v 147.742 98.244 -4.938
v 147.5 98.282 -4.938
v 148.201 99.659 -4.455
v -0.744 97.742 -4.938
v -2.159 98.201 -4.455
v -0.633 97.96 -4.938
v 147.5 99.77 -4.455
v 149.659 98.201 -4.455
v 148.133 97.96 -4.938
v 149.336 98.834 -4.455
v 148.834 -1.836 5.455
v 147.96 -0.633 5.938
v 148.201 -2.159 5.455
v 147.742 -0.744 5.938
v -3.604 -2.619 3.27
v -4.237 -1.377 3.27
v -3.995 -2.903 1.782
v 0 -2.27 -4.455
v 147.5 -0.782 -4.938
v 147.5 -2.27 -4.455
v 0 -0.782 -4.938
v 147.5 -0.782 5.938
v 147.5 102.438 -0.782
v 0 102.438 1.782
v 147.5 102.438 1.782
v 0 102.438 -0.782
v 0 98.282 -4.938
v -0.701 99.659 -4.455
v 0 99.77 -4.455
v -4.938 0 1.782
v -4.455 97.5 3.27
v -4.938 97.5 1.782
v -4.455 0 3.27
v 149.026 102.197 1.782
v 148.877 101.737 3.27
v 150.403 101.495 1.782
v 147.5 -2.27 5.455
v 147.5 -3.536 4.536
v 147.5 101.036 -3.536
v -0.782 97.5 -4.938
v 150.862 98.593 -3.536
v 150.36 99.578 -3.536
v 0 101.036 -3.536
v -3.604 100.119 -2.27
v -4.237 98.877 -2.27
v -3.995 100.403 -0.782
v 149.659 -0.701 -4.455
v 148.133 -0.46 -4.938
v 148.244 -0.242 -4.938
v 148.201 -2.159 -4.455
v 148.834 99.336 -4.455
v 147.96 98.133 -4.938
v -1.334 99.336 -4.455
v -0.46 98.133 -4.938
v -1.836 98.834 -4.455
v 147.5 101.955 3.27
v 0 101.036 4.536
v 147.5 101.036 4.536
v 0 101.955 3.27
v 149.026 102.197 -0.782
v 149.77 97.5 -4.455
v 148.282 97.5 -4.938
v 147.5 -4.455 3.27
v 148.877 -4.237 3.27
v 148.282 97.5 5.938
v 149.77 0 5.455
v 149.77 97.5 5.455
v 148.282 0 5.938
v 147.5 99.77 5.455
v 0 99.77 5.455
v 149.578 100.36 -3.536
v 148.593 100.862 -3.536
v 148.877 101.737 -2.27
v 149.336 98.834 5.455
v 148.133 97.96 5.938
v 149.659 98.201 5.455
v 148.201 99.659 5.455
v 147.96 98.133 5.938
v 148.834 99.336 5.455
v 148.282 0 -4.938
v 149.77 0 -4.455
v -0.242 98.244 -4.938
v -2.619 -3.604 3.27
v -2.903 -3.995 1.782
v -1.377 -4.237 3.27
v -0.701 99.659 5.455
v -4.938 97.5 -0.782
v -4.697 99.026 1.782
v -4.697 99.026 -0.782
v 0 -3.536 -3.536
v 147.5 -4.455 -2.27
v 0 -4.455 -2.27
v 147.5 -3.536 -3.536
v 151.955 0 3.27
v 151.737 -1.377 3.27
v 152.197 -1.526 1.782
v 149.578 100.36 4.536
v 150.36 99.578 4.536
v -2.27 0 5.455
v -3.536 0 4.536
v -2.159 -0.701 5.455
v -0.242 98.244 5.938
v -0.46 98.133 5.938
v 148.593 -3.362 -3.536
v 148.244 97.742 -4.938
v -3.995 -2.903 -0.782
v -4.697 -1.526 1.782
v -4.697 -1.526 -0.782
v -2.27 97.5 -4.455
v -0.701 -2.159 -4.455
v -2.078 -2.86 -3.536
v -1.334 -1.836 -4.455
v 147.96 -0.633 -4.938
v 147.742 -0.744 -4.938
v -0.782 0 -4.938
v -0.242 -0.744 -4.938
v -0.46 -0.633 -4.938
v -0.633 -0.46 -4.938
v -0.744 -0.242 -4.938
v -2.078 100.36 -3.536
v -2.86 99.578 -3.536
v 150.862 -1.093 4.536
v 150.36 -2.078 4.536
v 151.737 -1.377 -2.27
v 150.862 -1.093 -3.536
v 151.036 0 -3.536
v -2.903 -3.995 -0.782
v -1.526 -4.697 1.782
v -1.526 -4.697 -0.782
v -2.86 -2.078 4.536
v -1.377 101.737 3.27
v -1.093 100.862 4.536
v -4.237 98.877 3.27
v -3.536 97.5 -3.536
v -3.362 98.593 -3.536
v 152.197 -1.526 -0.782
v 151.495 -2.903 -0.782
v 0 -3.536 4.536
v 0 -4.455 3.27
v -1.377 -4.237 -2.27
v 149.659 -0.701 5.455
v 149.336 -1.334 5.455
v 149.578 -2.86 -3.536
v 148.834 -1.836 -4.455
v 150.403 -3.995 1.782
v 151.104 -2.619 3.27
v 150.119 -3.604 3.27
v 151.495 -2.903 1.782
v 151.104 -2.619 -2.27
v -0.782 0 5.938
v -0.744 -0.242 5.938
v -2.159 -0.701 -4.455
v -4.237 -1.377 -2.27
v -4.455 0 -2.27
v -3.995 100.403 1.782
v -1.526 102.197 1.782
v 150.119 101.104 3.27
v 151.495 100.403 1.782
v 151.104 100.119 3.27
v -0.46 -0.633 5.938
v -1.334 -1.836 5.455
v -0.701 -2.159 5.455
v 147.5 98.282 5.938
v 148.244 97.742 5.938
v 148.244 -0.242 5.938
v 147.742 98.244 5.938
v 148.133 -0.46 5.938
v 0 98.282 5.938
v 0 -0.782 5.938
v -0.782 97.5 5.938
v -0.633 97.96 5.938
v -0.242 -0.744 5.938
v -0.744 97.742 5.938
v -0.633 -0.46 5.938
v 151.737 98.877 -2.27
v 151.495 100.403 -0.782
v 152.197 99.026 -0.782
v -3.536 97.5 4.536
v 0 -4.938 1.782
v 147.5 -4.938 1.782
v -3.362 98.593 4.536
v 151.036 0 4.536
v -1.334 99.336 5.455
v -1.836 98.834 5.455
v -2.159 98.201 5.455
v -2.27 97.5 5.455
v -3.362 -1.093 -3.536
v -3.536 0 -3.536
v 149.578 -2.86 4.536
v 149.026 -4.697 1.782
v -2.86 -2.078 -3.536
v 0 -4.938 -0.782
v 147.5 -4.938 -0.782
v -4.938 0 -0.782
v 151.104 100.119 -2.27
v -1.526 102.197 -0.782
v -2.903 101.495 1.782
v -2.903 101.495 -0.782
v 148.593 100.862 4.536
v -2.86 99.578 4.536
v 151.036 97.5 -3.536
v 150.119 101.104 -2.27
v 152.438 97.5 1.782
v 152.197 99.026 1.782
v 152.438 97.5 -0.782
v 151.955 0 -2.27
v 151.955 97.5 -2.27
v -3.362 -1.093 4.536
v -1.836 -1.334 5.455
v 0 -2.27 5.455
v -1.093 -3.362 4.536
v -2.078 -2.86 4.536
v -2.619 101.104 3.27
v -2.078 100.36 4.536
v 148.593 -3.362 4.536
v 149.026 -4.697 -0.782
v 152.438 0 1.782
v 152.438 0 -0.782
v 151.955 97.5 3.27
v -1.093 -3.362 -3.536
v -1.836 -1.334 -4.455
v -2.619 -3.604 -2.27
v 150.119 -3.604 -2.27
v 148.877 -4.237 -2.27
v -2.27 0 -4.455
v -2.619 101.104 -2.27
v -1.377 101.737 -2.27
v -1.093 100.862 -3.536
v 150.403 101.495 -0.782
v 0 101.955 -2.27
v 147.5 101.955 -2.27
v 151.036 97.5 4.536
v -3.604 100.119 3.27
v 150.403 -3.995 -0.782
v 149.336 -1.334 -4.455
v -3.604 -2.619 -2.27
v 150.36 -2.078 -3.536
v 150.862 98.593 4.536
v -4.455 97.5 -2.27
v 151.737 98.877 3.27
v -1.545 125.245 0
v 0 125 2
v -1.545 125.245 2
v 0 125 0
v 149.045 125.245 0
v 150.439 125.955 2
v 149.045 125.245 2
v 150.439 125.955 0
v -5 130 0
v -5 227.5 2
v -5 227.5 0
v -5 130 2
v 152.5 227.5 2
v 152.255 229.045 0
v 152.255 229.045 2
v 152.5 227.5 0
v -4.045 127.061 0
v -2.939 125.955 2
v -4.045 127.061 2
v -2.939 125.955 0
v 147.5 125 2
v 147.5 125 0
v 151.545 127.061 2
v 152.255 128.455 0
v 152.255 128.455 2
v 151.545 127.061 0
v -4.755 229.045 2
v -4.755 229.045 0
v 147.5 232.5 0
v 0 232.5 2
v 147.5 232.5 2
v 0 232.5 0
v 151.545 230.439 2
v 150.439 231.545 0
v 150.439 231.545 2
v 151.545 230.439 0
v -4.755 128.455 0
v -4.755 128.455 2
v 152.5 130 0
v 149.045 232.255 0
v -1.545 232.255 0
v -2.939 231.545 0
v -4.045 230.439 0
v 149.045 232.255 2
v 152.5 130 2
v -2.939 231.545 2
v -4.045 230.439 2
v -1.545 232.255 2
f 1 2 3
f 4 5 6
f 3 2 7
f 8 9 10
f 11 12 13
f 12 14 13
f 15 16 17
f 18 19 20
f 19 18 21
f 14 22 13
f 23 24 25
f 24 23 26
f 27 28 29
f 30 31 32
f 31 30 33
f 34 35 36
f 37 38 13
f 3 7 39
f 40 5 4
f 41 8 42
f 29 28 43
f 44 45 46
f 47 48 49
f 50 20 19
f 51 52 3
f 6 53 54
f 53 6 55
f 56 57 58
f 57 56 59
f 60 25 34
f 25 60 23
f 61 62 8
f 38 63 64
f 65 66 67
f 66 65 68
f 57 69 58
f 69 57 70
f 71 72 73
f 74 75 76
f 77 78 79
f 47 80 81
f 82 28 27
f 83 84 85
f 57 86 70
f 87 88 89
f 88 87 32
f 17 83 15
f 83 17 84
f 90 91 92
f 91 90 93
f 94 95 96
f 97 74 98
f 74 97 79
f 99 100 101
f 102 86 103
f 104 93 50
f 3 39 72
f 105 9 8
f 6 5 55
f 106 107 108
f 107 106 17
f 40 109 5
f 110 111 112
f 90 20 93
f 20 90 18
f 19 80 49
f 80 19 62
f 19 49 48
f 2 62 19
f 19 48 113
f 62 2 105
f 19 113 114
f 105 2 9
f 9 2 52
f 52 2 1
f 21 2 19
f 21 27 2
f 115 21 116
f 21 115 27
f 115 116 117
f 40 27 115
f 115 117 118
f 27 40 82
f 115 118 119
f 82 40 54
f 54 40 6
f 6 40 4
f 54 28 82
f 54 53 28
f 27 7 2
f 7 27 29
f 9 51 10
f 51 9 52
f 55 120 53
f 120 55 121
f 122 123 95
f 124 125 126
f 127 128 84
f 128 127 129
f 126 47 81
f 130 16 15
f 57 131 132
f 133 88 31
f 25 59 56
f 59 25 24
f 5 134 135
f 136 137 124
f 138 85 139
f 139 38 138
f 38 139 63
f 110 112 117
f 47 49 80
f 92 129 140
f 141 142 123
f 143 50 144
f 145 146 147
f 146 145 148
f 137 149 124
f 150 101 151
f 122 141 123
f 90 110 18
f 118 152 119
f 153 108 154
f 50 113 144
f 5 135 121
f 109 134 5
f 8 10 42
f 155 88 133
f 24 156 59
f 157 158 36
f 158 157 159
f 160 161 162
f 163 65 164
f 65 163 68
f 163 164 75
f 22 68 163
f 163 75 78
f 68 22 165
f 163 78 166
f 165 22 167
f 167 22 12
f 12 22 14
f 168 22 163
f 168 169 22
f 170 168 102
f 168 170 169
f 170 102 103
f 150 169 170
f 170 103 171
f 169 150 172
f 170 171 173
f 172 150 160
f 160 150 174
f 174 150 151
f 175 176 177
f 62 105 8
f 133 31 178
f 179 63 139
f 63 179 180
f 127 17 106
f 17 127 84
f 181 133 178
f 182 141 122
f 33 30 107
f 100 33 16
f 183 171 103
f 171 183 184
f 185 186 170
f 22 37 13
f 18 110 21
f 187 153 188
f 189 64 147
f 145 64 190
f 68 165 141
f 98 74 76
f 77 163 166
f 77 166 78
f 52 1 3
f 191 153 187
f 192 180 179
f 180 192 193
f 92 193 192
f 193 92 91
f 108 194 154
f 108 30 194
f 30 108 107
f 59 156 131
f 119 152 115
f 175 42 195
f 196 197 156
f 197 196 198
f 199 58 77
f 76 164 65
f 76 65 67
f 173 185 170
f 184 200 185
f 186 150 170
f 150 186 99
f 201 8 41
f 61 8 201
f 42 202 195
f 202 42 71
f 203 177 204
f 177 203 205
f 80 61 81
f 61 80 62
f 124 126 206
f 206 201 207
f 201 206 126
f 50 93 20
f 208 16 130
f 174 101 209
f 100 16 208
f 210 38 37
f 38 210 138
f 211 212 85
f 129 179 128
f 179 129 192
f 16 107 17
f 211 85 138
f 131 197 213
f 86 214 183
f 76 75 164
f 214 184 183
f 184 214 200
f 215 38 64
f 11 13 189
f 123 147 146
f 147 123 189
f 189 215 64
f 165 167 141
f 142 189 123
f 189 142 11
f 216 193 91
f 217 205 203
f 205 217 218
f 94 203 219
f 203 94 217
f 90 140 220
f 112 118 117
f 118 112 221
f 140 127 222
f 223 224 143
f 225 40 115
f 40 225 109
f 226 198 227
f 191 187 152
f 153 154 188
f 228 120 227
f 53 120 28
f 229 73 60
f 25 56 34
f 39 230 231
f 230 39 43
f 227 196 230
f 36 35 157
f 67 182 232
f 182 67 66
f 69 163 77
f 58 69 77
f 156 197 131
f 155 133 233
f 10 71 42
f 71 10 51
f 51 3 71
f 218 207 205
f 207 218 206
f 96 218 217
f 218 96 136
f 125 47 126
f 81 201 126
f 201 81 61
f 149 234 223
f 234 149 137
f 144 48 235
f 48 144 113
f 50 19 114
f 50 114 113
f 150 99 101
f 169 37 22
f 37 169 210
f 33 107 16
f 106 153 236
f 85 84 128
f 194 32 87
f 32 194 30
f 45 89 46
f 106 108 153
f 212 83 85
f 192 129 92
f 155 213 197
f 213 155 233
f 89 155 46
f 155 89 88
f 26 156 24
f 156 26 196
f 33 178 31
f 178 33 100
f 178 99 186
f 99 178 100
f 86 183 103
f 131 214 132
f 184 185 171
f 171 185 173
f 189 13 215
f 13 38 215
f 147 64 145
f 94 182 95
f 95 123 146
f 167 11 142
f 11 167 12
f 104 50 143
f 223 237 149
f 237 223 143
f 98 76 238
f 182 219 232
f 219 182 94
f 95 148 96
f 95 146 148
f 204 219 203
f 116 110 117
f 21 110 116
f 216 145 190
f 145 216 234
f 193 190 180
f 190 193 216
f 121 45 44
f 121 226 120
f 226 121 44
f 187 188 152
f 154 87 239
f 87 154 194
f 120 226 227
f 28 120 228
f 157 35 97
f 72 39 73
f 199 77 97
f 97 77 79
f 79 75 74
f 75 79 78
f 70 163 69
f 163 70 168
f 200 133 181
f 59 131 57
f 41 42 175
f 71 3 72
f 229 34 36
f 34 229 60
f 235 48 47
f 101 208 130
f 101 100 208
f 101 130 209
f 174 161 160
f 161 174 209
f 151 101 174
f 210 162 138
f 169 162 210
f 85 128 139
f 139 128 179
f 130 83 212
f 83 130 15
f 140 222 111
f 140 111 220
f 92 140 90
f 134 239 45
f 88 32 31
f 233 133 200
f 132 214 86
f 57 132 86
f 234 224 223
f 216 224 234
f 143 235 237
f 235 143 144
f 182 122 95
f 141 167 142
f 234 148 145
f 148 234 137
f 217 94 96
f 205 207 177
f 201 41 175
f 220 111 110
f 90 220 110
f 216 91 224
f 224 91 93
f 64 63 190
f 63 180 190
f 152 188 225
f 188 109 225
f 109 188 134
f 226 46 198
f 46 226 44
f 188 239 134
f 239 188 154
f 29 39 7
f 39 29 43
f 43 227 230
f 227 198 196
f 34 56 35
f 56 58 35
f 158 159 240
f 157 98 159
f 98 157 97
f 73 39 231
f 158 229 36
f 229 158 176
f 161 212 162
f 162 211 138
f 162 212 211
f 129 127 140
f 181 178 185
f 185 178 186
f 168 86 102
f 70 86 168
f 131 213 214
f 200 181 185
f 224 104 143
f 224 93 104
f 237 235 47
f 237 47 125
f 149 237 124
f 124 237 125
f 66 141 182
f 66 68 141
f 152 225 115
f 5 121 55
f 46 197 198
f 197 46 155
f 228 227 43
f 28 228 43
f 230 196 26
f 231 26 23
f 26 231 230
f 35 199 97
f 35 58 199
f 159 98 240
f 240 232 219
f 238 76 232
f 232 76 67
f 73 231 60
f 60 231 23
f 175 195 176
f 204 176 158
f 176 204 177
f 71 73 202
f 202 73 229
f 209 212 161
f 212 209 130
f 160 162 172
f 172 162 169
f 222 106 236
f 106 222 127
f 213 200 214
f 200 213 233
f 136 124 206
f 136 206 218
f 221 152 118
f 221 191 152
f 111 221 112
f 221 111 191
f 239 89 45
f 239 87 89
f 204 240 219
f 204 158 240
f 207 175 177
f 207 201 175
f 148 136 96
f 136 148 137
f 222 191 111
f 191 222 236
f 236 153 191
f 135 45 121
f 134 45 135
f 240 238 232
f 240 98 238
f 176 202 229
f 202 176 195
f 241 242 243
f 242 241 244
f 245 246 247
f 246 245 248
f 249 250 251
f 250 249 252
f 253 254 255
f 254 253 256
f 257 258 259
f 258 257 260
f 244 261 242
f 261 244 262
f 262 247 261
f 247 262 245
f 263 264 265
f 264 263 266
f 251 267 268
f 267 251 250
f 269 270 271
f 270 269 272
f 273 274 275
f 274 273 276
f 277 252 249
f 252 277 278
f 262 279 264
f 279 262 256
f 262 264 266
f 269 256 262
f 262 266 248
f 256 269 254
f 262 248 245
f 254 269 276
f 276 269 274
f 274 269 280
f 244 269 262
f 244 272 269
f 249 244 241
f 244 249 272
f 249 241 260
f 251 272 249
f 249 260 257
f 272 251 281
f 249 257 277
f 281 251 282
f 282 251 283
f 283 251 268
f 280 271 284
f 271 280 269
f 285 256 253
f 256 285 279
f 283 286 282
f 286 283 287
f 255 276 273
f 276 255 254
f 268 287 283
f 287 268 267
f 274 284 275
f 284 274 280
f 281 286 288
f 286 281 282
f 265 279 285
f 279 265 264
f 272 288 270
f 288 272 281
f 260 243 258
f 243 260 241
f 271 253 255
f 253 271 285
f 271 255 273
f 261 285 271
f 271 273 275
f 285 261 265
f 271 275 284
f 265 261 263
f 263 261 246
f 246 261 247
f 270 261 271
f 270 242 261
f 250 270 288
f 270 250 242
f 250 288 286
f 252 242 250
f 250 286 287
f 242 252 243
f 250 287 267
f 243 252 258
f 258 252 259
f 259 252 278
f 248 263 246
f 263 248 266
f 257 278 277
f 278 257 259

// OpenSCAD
// file: ../../rounded-cube.scad
/**
 * 
 *  some parts of this software were inspired by 
 *   	
 * 	     http://www.thingiverse.com/thing:9347
 * 
 */
 
/**
 * makes a rounded cube
 */
module roundedCube(size=[20,20,2], cornerRadius=4, sides=30, sidesOnly=false, cubeCentered=false)
{
    $fn=sides;

    x = size[0] - cornerRadius/2;
    y = size[1] - cornerRadius/2;
    z = size[2];

    minkowski(size, cornerRadius)
    {
        cube(size=[x,y,z], center=cubeCentered);

        if(sidesOnly)
        {
            cylinder(r=cornerRadius);
        }
        else
        {
            sphere(r=cornerRadius);	    	
        }
    };
}
// main file
use <../../rounded-cube.scad>
        
boardLength = 150;
boardWidth = 100;

roundedCube([boardLength, boardWidth, 1], 5, sides=20);

translate([0, 130, 0])
roundedCube([boardLength, boardWidth, 1], 5, sides=20, sidesOnly=true);
